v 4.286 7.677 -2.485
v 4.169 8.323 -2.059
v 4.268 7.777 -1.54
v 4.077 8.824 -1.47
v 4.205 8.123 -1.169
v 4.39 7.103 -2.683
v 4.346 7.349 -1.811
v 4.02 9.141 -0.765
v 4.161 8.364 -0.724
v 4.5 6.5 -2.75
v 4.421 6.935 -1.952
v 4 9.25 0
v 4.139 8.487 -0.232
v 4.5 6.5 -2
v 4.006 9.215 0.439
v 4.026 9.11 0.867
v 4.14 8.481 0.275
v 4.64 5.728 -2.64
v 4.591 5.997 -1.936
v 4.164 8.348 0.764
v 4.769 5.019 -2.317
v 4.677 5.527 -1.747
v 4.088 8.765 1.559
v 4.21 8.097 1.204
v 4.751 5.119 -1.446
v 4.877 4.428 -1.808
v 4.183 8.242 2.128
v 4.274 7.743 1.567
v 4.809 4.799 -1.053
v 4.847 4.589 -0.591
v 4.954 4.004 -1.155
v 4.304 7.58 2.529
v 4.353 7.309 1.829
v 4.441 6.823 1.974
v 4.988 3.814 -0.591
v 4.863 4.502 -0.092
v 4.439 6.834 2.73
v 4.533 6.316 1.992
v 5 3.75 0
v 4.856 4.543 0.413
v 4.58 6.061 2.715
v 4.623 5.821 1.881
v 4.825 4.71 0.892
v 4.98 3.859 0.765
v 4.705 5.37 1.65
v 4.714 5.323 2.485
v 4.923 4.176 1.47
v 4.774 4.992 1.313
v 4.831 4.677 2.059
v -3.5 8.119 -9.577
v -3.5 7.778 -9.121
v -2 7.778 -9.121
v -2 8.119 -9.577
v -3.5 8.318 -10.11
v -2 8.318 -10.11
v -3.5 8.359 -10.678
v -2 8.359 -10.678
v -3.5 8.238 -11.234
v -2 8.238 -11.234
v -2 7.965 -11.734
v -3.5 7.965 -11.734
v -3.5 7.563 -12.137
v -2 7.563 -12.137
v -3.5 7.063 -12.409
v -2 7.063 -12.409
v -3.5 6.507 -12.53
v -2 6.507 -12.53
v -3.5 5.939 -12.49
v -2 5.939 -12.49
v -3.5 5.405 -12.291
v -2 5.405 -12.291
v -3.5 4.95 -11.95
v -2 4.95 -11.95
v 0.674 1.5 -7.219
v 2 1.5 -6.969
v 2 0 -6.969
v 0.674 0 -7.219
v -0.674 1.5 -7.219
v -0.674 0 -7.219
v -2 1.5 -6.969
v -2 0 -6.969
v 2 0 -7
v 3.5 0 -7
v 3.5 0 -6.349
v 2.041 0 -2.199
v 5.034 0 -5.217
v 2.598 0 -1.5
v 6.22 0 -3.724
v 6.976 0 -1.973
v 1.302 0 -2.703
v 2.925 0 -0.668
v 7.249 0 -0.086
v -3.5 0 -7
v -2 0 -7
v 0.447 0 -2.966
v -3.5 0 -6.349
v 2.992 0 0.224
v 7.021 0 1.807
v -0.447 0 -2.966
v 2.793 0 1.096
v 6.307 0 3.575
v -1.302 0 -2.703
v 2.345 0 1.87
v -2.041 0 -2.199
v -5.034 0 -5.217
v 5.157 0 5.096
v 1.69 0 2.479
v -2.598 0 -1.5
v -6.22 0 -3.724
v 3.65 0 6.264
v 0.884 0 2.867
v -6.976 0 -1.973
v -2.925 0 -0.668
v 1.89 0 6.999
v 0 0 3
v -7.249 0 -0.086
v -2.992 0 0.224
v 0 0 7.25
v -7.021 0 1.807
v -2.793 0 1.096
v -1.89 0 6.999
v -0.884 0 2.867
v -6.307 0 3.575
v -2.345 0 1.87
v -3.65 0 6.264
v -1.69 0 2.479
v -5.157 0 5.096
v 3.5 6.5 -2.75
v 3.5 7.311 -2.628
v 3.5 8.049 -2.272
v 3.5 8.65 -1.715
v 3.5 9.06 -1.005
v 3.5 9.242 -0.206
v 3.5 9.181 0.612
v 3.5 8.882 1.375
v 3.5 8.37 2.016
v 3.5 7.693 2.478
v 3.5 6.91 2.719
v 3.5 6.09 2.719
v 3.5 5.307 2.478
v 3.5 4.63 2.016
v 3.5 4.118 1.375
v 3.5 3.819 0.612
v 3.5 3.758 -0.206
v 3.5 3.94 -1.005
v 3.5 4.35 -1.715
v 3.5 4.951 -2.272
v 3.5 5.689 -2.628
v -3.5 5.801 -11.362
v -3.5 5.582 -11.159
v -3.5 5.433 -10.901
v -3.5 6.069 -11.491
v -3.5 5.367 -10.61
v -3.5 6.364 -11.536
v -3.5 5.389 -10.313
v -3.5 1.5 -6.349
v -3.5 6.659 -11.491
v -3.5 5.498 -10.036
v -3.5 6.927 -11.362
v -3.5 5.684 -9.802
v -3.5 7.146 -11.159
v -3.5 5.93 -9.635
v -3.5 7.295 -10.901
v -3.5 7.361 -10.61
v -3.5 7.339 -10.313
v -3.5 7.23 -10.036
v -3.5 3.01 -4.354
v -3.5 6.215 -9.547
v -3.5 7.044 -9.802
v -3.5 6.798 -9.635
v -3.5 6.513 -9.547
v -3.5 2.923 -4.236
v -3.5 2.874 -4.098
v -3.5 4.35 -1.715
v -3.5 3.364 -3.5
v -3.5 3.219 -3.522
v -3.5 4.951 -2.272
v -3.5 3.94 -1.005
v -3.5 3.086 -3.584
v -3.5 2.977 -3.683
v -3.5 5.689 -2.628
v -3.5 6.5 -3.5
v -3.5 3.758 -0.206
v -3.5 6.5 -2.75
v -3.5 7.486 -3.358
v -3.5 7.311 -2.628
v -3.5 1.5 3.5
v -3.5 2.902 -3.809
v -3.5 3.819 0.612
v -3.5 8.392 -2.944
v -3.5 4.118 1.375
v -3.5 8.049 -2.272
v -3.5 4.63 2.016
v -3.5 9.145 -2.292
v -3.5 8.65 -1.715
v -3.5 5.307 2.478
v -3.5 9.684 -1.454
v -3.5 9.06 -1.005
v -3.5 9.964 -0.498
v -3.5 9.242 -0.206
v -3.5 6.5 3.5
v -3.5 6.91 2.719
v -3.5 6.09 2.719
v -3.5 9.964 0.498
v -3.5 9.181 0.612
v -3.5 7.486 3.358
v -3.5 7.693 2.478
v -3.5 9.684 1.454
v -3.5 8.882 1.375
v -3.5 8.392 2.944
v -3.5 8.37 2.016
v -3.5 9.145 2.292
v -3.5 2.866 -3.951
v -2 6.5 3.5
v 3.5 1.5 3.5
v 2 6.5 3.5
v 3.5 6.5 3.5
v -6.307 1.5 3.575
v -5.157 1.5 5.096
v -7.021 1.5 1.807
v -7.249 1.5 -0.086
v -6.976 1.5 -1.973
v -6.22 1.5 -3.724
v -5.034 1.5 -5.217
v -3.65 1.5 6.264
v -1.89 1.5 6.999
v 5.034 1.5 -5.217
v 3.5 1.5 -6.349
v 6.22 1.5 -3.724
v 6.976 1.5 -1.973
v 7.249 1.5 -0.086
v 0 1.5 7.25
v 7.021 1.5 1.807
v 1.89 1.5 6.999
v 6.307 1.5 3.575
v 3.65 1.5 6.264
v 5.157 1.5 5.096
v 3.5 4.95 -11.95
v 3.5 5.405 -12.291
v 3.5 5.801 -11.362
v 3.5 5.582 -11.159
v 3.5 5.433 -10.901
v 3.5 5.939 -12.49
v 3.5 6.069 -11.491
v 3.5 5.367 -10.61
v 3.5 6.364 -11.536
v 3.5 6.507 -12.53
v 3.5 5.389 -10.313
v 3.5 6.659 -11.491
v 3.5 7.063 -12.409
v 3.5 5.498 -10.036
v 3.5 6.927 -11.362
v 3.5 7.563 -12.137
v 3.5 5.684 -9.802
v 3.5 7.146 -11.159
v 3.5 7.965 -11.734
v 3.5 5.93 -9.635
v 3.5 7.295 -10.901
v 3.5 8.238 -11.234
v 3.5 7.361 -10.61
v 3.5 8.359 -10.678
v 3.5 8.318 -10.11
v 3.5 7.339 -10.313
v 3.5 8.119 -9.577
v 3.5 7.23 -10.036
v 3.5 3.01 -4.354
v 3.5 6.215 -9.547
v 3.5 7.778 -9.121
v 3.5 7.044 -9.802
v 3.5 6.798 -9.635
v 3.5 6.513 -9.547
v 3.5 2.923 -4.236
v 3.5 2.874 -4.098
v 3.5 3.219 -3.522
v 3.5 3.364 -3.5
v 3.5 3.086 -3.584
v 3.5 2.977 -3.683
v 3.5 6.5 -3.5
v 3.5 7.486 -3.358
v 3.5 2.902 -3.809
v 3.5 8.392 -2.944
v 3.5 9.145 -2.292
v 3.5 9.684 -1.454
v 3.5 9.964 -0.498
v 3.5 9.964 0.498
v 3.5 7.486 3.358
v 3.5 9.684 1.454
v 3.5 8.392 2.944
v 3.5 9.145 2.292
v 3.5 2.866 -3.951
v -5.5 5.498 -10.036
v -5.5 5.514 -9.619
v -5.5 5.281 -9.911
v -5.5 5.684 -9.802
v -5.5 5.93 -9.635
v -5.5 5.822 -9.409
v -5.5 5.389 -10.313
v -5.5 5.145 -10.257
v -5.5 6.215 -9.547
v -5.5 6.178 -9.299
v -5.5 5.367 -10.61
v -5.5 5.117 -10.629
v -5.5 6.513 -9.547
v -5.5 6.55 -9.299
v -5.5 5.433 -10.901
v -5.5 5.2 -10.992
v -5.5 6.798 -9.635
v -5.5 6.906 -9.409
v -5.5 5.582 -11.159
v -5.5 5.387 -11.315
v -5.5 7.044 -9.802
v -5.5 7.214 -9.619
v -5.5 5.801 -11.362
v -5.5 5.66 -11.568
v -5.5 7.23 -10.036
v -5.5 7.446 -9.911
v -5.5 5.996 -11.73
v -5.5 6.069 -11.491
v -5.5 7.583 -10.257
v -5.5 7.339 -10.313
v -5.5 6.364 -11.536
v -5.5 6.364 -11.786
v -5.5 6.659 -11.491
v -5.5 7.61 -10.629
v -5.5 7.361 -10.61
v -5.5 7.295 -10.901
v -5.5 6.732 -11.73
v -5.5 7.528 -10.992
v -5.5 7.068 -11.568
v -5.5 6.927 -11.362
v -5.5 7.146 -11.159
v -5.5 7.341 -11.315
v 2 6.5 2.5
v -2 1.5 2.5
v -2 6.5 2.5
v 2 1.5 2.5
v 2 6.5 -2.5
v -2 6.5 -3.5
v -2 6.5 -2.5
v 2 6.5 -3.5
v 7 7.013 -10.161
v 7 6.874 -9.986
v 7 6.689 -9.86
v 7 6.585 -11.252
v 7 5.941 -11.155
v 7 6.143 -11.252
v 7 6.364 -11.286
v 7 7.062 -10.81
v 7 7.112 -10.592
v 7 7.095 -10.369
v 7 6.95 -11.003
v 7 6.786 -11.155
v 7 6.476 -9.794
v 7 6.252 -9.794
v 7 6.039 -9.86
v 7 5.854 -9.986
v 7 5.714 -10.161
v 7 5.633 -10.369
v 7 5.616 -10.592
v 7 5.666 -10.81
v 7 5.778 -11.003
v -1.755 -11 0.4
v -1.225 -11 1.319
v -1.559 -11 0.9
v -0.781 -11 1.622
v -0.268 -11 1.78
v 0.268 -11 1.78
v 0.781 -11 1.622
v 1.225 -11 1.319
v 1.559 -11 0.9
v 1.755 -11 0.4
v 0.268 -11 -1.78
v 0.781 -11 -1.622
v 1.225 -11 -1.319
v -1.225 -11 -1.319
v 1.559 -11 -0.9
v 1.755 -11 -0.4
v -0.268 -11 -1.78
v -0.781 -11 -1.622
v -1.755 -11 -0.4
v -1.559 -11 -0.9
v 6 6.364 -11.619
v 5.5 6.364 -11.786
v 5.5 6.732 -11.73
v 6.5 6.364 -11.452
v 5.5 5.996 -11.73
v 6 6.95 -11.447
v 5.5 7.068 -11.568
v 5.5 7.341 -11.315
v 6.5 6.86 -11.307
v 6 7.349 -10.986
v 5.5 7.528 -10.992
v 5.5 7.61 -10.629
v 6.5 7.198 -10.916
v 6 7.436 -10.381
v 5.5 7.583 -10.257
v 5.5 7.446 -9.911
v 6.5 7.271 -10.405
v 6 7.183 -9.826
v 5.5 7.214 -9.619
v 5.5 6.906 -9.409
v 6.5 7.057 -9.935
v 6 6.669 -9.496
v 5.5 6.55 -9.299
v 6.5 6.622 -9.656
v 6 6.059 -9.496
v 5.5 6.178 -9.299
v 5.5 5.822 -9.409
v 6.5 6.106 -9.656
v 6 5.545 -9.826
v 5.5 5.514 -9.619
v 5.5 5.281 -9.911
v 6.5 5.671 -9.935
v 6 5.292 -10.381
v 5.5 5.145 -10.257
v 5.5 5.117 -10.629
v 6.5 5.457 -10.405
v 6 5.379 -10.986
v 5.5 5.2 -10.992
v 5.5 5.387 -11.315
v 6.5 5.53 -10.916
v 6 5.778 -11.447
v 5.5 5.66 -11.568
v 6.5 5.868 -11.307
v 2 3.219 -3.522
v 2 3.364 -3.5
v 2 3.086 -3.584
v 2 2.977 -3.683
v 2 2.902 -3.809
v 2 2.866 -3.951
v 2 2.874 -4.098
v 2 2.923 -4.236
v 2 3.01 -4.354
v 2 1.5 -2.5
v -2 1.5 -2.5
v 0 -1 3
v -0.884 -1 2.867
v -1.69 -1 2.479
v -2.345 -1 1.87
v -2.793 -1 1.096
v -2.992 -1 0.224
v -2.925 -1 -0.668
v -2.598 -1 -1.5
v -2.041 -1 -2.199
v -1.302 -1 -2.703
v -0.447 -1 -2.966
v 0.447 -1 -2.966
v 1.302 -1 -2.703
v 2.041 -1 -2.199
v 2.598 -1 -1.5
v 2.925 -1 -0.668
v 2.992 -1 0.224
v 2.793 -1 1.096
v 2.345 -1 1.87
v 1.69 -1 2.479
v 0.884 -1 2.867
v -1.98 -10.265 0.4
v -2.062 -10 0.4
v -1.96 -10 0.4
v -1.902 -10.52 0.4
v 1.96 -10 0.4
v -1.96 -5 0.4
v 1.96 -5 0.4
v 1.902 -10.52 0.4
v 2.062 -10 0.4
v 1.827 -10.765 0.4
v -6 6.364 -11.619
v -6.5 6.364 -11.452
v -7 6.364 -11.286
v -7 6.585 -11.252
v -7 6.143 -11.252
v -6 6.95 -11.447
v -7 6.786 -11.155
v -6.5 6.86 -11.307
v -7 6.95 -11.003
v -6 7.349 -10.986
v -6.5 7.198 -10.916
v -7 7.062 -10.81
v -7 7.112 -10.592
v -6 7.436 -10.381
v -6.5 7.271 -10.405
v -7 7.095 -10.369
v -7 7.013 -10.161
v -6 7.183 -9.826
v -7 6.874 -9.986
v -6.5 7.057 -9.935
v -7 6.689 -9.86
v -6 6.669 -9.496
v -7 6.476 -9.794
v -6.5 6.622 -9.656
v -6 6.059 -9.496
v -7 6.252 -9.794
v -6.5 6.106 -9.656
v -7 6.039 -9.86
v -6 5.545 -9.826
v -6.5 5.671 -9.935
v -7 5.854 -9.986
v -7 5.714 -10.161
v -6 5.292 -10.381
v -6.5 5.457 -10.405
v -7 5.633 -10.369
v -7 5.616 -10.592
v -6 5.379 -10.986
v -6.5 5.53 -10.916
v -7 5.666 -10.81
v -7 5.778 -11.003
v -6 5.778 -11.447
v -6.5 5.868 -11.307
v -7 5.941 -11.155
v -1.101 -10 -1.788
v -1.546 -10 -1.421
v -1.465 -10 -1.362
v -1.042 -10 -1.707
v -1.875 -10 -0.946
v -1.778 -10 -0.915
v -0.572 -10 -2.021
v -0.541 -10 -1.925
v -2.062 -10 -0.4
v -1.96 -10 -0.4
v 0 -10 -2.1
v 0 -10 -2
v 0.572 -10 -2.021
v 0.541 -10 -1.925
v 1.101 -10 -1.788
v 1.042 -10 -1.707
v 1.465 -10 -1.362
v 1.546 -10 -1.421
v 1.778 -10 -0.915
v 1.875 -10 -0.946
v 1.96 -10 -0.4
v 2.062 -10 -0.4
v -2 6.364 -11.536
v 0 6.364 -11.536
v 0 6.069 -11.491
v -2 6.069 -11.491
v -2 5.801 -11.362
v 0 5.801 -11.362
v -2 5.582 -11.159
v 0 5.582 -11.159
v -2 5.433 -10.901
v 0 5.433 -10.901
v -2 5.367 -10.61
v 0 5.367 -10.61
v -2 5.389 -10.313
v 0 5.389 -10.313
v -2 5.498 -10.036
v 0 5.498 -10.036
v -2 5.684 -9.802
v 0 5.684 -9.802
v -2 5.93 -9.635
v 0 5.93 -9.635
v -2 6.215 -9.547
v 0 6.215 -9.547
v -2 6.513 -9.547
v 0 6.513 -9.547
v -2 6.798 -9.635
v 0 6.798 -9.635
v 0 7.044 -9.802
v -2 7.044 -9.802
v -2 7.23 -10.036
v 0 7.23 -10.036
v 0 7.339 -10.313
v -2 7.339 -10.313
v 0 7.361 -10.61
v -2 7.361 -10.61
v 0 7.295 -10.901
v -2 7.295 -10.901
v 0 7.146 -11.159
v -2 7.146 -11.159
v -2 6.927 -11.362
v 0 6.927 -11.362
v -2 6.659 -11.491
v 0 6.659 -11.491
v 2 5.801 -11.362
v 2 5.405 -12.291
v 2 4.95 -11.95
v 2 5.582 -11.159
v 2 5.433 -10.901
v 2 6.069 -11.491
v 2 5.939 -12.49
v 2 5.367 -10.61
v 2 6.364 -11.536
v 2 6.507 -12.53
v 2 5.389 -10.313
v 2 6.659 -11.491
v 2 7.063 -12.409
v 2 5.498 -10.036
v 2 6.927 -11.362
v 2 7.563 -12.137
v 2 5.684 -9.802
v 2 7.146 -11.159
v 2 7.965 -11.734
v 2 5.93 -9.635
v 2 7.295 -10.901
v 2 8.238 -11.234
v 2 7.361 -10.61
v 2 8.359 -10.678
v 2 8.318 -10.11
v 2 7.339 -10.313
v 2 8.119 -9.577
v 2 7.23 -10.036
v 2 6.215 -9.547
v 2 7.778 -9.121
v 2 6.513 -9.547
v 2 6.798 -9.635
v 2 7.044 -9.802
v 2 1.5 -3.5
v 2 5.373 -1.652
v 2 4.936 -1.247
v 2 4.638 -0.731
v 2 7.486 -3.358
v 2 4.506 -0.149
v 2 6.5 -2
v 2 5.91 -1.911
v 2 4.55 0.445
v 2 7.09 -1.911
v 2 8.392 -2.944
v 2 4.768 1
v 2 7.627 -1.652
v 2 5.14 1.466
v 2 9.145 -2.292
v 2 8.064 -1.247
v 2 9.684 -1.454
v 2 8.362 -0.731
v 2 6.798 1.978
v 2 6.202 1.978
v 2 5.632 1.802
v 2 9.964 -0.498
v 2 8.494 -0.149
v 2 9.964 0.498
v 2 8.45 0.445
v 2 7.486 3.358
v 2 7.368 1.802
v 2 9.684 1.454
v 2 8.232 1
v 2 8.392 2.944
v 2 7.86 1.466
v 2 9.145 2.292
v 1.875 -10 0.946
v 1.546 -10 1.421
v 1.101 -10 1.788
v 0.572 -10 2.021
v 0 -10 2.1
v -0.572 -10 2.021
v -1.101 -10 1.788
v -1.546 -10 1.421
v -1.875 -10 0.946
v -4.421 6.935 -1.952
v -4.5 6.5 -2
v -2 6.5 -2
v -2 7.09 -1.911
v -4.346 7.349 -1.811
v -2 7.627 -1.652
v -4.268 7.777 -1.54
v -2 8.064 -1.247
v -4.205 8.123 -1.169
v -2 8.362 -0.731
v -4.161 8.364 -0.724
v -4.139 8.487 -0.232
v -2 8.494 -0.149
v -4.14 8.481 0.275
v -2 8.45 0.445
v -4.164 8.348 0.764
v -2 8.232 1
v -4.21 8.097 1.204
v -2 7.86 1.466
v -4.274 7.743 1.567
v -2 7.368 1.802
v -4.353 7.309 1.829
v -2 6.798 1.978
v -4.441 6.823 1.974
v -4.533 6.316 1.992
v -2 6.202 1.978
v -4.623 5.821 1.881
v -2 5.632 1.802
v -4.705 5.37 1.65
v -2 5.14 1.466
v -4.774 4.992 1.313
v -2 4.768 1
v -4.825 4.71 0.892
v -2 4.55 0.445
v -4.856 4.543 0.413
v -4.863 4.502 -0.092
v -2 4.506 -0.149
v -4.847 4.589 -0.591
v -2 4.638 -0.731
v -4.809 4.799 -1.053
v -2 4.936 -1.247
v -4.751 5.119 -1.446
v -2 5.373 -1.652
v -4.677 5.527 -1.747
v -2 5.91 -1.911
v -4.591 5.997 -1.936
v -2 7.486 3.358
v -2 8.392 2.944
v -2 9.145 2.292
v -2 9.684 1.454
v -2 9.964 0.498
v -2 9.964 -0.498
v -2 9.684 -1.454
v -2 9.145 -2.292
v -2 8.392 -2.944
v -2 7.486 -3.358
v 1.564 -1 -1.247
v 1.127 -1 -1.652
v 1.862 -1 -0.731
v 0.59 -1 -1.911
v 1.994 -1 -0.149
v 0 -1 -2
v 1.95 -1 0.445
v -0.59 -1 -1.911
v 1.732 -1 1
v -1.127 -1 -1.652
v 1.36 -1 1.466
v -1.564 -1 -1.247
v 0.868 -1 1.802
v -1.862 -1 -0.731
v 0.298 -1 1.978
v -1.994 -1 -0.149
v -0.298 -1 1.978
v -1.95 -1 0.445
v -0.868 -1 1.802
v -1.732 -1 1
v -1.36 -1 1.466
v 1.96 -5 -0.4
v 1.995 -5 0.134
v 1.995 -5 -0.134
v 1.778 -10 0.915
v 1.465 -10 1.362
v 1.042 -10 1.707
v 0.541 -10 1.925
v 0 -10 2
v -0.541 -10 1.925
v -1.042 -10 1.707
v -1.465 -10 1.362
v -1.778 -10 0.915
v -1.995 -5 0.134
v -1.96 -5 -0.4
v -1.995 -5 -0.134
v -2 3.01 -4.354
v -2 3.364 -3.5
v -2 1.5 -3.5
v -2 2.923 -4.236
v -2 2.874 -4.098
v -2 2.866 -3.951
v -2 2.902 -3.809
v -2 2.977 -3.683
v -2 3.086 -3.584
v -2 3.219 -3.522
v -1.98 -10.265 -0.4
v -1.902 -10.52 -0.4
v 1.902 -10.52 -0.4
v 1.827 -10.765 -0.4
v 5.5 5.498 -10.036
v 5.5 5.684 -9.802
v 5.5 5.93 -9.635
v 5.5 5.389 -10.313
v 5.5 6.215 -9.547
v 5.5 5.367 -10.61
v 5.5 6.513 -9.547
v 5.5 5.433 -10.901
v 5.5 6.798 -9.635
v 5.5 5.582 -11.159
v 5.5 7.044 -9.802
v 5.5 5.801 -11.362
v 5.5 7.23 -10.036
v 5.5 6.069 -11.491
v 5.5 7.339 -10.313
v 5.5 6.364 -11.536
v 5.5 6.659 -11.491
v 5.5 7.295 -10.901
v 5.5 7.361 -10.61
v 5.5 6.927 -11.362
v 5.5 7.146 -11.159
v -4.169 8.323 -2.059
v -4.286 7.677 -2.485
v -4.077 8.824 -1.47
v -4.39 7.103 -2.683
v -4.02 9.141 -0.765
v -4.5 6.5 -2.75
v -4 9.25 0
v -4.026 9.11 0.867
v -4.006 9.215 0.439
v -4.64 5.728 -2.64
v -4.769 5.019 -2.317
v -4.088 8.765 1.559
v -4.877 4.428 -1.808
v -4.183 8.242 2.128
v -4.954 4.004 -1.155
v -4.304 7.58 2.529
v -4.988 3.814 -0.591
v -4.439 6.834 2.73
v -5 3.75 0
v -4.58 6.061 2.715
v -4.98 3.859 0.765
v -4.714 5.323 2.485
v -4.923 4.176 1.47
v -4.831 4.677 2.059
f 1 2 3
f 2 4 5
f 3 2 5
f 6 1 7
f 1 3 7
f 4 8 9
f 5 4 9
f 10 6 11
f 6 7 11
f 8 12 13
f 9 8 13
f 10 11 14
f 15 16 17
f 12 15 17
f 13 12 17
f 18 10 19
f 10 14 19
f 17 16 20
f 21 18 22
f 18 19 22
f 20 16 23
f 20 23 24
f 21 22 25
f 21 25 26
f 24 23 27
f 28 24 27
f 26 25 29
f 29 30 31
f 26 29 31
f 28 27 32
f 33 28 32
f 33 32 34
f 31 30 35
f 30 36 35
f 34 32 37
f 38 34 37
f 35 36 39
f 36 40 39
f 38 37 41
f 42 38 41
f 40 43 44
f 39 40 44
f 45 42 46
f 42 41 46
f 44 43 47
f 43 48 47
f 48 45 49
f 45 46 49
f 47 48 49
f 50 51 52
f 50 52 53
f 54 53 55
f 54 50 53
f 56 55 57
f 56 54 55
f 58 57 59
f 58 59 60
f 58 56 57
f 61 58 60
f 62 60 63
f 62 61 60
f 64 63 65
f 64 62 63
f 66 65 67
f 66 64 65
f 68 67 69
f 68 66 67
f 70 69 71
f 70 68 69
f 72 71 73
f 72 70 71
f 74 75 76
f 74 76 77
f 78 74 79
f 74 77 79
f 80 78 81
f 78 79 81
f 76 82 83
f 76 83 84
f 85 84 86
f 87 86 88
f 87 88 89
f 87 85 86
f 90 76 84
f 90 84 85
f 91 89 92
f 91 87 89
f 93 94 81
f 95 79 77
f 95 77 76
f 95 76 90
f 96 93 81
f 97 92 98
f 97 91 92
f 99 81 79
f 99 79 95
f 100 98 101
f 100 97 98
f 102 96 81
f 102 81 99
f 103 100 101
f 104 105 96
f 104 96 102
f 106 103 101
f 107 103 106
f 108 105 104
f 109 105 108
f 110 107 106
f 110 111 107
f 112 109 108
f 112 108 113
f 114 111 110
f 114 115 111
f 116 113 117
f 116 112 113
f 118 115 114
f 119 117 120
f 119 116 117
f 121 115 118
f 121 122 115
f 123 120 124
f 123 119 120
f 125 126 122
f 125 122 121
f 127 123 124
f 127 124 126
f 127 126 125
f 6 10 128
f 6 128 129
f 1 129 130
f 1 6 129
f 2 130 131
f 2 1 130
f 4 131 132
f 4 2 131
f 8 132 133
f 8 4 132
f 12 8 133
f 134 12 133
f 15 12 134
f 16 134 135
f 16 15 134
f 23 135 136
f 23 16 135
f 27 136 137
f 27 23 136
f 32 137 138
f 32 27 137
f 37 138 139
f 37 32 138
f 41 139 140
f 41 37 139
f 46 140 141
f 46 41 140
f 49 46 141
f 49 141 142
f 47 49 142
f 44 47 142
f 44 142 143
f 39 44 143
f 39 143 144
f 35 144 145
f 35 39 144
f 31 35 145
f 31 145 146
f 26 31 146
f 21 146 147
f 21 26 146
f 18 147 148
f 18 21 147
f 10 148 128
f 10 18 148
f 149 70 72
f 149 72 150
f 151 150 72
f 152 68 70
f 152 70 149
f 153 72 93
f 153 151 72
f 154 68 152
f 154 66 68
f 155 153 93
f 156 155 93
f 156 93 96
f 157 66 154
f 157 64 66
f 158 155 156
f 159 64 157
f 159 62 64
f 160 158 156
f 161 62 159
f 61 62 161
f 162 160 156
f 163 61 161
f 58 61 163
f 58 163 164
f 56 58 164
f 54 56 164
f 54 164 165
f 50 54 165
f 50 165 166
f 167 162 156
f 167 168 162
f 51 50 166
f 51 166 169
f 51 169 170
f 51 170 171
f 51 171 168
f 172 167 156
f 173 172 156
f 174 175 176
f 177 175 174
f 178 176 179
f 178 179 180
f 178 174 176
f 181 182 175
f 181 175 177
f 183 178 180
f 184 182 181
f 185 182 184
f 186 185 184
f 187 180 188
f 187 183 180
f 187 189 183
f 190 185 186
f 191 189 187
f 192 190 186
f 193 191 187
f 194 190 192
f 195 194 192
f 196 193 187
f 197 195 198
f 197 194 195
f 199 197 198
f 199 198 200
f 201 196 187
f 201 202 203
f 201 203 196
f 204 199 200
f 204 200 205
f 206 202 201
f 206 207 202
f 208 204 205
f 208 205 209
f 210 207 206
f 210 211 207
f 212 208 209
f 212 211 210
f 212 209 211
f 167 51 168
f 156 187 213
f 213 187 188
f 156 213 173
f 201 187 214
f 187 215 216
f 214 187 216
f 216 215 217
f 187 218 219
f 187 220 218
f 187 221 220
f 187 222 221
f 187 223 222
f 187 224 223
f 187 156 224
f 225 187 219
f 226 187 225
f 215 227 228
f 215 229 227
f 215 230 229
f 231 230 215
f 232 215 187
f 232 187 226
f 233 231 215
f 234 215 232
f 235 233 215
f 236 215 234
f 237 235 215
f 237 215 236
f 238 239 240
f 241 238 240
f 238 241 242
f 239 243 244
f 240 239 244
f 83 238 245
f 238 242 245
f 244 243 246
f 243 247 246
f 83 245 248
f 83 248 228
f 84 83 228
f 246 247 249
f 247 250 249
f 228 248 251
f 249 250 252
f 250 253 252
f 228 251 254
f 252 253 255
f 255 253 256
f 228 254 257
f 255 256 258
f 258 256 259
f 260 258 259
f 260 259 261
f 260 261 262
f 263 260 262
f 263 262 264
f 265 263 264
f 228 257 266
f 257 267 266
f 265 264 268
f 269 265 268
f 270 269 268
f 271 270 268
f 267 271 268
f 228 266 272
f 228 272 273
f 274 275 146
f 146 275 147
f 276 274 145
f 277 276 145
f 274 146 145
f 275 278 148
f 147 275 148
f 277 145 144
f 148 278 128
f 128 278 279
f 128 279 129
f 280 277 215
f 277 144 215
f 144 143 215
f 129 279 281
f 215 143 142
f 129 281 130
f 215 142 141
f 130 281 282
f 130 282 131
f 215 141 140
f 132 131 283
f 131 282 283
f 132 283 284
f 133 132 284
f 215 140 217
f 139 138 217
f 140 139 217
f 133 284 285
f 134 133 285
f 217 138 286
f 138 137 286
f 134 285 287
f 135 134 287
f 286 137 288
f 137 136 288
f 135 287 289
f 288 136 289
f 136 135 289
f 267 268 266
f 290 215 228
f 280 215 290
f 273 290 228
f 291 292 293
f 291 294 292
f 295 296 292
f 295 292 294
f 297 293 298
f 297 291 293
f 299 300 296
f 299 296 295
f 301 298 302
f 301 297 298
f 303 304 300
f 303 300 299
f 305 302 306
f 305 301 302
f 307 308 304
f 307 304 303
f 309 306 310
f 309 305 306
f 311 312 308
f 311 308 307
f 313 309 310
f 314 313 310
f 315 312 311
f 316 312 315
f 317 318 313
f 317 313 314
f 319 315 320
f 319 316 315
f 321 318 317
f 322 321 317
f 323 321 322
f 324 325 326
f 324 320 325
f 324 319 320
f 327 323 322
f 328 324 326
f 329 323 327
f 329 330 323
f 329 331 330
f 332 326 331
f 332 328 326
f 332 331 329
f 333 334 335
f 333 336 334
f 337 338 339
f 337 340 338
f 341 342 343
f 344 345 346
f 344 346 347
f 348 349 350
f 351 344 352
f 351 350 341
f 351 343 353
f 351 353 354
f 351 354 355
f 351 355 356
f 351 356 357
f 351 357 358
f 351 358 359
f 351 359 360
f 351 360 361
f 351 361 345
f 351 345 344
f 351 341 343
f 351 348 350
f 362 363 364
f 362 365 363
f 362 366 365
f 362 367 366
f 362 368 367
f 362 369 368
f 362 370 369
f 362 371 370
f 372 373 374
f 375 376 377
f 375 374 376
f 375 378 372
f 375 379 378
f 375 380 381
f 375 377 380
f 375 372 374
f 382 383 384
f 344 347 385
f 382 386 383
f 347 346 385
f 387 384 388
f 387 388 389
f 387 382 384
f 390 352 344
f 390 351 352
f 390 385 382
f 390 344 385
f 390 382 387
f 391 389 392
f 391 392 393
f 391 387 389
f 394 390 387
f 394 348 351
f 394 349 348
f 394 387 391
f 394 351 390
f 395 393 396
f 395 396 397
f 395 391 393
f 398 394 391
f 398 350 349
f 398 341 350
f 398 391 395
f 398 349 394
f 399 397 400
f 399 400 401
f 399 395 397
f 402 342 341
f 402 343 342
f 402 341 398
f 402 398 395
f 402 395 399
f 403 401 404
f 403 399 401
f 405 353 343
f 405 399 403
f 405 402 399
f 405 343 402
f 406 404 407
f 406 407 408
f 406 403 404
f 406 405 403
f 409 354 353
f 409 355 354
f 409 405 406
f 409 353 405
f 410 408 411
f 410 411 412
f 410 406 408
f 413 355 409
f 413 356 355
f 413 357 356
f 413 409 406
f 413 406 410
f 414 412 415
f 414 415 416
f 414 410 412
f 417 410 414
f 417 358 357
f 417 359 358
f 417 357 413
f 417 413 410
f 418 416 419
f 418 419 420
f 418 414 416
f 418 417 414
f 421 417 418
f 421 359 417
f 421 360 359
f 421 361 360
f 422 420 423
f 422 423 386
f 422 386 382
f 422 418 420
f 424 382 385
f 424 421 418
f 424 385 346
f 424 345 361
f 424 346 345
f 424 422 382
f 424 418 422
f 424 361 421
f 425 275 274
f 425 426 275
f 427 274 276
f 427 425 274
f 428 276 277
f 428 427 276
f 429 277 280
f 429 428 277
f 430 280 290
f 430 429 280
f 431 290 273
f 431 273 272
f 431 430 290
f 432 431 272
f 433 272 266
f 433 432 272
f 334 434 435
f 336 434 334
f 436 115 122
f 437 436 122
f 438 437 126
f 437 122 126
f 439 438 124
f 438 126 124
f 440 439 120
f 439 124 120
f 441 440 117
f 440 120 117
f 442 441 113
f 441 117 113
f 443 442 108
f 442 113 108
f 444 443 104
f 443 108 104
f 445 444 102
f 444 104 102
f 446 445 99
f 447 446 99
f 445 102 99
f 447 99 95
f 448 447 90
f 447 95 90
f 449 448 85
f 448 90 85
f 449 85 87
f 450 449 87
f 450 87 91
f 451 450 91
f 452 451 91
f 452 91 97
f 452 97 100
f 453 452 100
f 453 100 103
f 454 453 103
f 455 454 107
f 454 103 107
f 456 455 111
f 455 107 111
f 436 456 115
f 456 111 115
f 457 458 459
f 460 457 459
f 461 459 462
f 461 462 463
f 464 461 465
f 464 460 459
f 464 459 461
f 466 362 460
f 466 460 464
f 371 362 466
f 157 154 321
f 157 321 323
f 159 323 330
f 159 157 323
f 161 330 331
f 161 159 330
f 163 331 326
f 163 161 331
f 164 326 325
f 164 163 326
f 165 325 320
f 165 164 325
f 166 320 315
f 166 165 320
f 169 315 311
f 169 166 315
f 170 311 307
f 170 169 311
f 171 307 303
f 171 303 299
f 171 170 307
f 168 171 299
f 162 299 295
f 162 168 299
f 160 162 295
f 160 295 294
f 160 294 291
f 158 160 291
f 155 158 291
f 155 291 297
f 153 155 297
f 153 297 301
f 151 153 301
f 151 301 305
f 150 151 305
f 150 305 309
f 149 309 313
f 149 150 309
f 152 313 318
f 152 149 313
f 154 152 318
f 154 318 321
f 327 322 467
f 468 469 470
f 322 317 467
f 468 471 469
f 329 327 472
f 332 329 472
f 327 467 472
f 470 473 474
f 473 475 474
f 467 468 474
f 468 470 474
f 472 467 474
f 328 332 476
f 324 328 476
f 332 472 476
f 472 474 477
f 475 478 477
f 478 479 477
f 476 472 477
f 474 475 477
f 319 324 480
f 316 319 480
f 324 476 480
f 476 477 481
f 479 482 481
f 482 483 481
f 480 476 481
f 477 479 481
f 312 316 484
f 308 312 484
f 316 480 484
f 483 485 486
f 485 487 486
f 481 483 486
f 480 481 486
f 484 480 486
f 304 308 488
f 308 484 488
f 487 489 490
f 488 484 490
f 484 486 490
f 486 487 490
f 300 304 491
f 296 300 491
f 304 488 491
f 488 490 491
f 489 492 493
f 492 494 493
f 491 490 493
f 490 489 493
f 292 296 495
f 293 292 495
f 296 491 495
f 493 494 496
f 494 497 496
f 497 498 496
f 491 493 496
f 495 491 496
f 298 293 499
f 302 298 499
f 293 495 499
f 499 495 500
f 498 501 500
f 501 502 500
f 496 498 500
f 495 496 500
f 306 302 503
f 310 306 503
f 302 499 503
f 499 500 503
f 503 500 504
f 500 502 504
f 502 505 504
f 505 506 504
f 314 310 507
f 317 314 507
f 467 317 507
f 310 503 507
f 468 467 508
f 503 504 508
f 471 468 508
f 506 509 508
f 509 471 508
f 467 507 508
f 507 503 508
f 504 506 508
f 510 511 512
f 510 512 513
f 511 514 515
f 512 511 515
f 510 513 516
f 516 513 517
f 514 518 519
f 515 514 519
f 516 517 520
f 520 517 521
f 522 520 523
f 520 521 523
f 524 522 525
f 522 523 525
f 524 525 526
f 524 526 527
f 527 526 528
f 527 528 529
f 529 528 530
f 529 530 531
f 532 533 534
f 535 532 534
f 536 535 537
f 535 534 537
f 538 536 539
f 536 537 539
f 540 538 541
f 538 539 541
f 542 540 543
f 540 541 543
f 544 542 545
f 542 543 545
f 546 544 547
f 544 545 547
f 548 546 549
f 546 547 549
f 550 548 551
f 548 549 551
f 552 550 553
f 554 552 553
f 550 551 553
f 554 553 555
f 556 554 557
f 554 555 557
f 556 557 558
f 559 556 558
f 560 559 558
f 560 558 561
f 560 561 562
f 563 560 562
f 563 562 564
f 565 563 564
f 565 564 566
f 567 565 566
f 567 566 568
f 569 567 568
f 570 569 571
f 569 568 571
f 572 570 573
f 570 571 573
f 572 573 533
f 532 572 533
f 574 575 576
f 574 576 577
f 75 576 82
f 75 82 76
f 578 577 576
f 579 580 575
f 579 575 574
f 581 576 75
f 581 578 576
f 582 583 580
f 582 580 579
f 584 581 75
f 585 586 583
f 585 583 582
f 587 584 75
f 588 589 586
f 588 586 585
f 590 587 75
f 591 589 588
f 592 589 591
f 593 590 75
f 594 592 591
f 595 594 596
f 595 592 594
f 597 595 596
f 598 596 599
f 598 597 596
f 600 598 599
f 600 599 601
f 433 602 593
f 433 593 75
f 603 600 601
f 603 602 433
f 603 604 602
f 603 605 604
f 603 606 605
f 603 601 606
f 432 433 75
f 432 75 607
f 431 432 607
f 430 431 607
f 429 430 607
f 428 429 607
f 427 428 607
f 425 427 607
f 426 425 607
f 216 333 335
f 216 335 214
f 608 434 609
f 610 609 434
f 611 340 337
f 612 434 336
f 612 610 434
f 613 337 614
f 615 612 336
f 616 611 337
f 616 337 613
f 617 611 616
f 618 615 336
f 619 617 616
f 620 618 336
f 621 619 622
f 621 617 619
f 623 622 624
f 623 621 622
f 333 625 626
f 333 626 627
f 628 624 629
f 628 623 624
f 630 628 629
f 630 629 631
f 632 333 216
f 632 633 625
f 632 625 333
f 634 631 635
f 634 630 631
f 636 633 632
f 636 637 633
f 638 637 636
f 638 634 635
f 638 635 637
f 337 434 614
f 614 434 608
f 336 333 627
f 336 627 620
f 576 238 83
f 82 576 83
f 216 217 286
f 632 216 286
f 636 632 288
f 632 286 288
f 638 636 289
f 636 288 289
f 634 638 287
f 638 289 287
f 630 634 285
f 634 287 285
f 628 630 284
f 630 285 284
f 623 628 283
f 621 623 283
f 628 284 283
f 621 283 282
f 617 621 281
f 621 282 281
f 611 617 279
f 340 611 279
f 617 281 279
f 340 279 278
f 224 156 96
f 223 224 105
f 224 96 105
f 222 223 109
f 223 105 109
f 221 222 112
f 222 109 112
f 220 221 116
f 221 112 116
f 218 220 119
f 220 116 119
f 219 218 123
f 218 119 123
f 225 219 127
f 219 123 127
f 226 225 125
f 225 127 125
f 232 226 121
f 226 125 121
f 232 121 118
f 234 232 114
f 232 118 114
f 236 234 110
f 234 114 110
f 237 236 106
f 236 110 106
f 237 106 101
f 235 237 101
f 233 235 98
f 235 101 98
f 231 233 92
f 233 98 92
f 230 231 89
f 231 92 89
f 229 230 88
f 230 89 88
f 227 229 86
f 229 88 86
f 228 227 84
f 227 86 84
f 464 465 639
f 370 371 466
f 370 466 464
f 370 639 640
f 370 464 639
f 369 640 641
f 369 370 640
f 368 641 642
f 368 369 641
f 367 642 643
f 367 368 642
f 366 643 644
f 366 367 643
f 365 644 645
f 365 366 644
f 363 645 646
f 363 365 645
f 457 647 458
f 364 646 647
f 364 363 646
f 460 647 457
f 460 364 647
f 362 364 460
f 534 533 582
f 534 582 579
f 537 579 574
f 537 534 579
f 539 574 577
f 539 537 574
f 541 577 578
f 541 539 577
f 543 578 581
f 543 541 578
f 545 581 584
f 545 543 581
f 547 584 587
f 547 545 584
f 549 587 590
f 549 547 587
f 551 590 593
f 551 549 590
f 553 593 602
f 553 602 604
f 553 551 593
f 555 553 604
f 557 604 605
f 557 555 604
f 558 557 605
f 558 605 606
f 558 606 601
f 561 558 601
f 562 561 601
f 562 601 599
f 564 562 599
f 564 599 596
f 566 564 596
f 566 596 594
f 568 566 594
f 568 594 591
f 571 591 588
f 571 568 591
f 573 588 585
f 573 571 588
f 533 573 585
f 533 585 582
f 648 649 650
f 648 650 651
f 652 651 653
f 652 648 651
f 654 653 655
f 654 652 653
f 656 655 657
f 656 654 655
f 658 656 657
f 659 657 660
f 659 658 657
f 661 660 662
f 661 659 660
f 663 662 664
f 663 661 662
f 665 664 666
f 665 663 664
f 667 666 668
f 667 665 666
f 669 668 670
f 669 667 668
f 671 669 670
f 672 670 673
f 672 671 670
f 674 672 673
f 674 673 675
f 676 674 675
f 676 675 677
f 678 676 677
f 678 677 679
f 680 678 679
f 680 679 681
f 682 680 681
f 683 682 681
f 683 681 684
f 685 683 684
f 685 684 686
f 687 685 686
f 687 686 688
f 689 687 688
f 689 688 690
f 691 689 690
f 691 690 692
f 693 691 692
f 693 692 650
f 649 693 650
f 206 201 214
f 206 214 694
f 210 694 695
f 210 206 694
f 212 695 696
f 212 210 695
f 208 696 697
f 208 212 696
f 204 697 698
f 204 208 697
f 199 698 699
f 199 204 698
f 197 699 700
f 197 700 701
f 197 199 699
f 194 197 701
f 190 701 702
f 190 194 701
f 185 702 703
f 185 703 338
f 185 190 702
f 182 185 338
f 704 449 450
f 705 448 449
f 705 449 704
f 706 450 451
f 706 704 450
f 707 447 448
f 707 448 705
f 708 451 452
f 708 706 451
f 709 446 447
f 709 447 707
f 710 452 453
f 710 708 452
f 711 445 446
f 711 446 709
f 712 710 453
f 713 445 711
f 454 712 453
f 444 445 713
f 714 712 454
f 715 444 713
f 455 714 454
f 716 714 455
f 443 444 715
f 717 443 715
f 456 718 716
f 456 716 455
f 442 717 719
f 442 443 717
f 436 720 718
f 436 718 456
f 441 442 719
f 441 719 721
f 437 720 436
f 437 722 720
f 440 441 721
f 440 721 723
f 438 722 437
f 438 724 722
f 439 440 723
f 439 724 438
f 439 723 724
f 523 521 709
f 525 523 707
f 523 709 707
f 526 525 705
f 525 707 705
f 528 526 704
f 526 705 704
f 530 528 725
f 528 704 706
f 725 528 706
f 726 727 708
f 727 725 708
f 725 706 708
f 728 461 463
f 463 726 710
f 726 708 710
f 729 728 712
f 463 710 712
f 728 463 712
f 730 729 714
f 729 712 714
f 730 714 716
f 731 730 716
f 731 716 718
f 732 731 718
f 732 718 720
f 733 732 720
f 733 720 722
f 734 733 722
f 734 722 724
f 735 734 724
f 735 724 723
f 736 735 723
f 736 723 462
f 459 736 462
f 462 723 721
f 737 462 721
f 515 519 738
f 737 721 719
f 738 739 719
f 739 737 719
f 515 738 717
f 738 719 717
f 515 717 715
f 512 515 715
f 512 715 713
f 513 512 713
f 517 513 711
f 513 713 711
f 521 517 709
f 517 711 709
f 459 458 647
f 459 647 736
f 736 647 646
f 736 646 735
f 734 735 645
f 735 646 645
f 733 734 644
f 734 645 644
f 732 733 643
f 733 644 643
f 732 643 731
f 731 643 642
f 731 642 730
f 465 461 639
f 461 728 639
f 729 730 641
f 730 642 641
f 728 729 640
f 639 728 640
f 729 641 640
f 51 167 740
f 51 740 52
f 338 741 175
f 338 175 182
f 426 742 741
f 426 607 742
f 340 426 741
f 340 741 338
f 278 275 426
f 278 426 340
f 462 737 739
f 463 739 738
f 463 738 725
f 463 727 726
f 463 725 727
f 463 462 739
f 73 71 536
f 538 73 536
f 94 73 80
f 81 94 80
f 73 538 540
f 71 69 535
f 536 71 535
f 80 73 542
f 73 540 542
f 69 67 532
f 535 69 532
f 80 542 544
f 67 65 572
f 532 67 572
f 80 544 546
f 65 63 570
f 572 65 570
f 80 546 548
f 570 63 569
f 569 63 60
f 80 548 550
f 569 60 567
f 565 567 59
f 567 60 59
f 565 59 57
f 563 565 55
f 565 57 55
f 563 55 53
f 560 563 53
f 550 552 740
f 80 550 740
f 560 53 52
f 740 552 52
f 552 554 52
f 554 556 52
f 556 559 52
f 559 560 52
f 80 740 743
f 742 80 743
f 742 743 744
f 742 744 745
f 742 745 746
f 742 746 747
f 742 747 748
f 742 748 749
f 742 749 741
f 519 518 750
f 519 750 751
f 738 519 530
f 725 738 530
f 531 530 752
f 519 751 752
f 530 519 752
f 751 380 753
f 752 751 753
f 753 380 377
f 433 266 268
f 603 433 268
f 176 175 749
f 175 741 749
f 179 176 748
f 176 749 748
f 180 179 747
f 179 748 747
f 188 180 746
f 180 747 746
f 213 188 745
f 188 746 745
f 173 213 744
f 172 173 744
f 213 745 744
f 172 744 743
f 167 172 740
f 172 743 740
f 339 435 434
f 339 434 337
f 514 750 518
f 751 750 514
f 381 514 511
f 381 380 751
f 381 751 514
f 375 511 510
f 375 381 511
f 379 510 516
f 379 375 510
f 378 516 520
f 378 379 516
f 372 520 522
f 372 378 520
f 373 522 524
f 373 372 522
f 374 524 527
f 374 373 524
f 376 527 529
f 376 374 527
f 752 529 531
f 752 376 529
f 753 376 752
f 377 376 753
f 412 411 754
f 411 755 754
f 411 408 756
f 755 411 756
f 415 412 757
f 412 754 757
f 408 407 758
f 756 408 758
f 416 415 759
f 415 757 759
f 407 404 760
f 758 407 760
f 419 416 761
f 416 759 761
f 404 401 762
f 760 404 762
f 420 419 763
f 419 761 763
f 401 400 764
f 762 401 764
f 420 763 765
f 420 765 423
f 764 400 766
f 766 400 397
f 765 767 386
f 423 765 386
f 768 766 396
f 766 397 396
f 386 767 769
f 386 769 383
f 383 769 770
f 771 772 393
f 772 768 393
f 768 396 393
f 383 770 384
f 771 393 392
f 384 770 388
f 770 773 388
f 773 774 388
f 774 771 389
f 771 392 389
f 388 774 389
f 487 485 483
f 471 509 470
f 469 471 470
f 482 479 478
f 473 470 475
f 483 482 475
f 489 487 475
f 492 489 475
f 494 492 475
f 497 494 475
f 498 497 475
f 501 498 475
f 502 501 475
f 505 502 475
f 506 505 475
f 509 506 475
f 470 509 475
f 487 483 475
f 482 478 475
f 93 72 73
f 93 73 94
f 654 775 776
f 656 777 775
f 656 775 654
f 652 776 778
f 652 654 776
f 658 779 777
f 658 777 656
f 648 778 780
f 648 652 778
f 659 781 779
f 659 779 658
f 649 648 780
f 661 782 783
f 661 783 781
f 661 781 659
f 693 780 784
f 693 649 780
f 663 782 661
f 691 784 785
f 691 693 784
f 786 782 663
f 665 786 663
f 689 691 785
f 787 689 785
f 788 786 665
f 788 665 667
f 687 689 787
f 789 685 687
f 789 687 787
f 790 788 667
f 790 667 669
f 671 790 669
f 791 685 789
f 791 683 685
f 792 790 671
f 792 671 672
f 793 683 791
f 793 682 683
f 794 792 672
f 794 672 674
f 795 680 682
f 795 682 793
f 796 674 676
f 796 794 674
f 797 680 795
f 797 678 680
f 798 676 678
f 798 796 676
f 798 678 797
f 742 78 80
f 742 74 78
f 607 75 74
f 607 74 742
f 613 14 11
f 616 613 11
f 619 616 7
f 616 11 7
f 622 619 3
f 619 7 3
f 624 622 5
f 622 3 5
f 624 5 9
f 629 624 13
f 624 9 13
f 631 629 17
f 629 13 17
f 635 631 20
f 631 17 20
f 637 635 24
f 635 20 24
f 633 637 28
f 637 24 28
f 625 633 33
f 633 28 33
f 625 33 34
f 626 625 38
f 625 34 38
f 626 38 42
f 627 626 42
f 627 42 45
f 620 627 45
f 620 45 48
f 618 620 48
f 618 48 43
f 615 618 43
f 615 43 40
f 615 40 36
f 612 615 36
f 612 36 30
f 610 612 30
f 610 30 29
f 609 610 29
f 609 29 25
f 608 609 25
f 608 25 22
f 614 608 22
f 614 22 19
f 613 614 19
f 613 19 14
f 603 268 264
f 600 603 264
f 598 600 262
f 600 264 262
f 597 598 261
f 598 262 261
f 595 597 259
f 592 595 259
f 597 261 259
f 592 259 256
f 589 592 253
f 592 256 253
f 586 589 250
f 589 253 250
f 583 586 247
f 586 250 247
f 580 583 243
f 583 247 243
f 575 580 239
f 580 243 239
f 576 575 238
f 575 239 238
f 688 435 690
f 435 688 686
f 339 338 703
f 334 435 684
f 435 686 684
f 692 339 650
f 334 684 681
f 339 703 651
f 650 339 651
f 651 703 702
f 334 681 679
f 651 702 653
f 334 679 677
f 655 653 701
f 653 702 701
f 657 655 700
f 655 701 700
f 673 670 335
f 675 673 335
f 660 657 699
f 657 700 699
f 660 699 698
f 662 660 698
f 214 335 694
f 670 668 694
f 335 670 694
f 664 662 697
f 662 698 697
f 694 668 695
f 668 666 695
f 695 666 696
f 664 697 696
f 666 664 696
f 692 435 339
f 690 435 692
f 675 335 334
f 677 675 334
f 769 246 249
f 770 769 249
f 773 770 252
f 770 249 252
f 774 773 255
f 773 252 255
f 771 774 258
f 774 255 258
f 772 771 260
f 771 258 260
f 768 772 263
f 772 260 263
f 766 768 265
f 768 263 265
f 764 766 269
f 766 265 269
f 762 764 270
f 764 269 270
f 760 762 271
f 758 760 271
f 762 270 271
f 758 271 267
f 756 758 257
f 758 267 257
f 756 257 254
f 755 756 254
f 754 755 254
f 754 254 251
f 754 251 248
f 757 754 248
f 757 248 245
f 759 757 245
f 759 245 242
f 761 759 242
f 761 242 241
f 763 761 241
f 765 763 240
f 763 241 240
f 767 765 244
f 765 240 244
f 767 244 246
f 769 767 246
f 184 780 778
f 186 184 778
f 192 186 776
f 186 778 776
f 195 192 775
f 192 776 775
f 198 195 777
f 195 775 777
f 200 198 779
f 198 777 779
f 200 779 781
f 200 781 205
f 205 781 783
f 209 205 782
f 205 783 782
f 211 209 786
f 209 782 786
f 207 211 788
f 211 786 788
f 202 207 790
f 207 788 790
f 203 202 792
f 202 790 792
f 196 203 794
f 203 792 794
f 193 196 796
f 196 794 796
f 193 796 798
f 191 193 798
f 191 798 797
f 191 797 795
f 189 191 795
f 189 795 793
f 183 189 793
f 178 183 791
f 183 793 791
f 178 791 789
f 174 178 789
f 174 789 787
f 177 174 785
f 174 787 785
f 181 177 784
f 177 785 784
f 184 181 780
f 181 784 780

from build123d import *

# Parameters (mm, degrees)
SKETCH_1_R          = 7.25
EXTRUDE_1_DEPTH     = 1.5
EXTRUDE_2_DEPTH     = 1.5
FILLET_1_R          = 0.5
CUT_EXTRUDE_1_REACH = 21.305
SKETCH_3_R          = 2
EXTRUDE_START       = 1.5
SKETCH_4_R          = 2.75
SKETCH_4_R_2        = 2
EXTRUDE_3_DEPTH     = 1.5
CUT_EXTRUDE_2_REACH = 22.241
SKETCH_6_R          = 1
EXTRUDE_4_DEPTH     = 2
SKETCH_7_R          = 1.25
SKETCH_8_R          = 0.75
EXTRUDE_START_2     = 2
SKETCH_9_R          = 1
SKETCH_9_W          = 1
SKETCH_9_H          = 5
EXTRUDE_5_DEPTH     = 2
SKETCH_10_R         = 3
EXTRUDE_6_DEPTH     = 1
SKETCH_11_R         = 2
EXTRUDE_7_DEPTH     = 9
SKETCH_12_R         = 2.1
SKETCH_13_R         = 1.8
SKETCH_14_W         = 8
SKETCH_14_H         = 0.8
CUT_EXTRUDE_3_DEPTH = 6


# Read off the part's stored shape, not the designer's step: 镜向1
with BuildPart() as part:
    # 草图1 → 凸台-拉伸1 (new body)
    with BuildSketch(Plane(origin=(0, 0, 0), x_dir=(1, 0, 0), z_dir=(0, 1, 0))):
        with Locations(Location((0, 0, 0), (0, 0, 270))):
            Circle(SKETCH_1_R)
    extrude(amount=EXTRUDE_1_DEPTH)

    # 草图2 → 凸台-拉伸2 (add)
    with BuildSketch(Plane(origin=(3.5, 0, 0), x_dir=(0, 0, -1), z_dir=(1, 0, 0))):
        with BuildLine():
            Line((0, 0), (-3.5, 0))
            Line((-3.5, 0), (-3.5, 6.5))
            ThreePointArc((-3.5, 6.5), (0, 10), (3.5, 6.5))
            Line((3.5, 6.5), (3.5, 2.156854249))
            Line((3.5, 2.156854249), (9.121320344, 7.778174593))
            ThreePointArc((9.121320344, 7.778174593), (11.949747468, 7.778174593), (11.949747468, 4.949747468))
            Line((11.949747468, 4.949747468), (7, 0))
            Line((7, 0), (0, 0))
        make_face()
    extrude(amount=-EXTRUDE_2_DEPTH)

    # 圆角1
    fillet_1_edges = [part.edges().sort_by_distance(p)[0] for p in [
        (2.75, 2.156854249, -3.5),
    ]]
    fillet(fillet_1_edges, radius=FILLET_1_R)

    # 草图3 → 切除-拉伸1 (cut, up to next)
    with BuildSketch(Plane(origin=(3.5, 0, 0), x_dir=(0, 0, -1), z_dir=(1, 0, 0)), mode=Mode.PRIVATE) as cut_extrude_1_sk1:
        with Locations((0, 6.5)):
            Circle(SKETCH_3_R)
    cut_extrude_1_tool1 = extrude(cut_extrude_1_sk1.sketch, amount=-CUT_EXTRUDE_1_REACH, mode=Mode.PRIVATE) & part.part
    add(cut_extrude_1_tool1.solids().sort_by_distance((3.5, 6.5, 0))[0], mode=Mode.SUBTRACT)

    # 草图4 → 凸台-拉伸3 (add)
    with BuildSketch(Plane(origin=(3.5, 0, 0), x_dir=(0, 0, -1), z_dir=(1, 0, 0)).offset(EXTRUDE_START)):
        with Locations((0, 6.5)):
            Circle(SKETCH_4_R)
        with Locations((0, 6.5)):
            Circle(SKETCH_4_R_2, mode=Mode.SUBTRACT)
    extrude(amount=-EXTRUDE_3_DEPTH)

    # 草图5 → 切除-拉伸2 (cut, up to next)
    with BuildSketch(Plane.XY.offset(3.5), mode=Mode.PRIVATE) as cut_extrude_2_sk1:
        Polygon((5, 9.25), (4, 9.25), (5, 3.75), align=None)
    cut_extrude_2_tool1 = extrude(cut_extrude_2_sk1.sketch, amount=-CUT_EXTRUDE_2_REACH, mode=Mode.PRIVATE) & part.part
    add(cut_extrude_2_tool1.solids().sort_by_distance((4.666667, 7.416667, 3.5))[0], mode=Mode.SUBTRACT)

    # 草图6 → 凸台-拉伸4 (add)
    with BuildSketch(Plane(origin=(3.5, 0, 0), x_dir=(0, 0, -1), z_dir=(1, 0, 0))):
        with Locations((10.535533906, 6.363961031)):
            Circle(SKETCH_6_R)
    extrude(amount=EXTRUDE_4_DEPTH)

    # 草图7 → 放样1 section 0
    with BuildSketch(Plane(origin=(5.5, 0, 0), x_dir=(0, 0, -1), z_dir=(1, 0, 0))):
        with Locations((10.535533906, 6.363961031)):
            Circle(SKETCH_7_R)
    # 草图8 → 放样1 section 1
    with BuildSketch(Plane(origin=(7, 0, 0), x_dir=(0, 0, -1), z_dir=(1, 0, 0))):
        with Locations((10.535533906, 6.363961031)):
            Circle(SKETCH_8_R)
    loft()

    # 草图9 → 凸台-拉伸5 (add)
    with BuildSketch(Plane.ZY.offset(-2).offset(EXTRUDE_START_2)):
        with Locations(Location((-10.535533906, 6.363961031, 0), (0, 0, 180))):
            Circle(SKETCH_9_R)
        with Locations((3, 4)):
            Rectangle(SKETCH_9_W, SKETCH_9_H)
        with Locations((-3, 4)):
            Rectangle(SKETCH_9_W, SKETCH_9_H)
    extrude(amount=-EXTRUDE_5_DEPTH)

    # 镜向1: part across plane


with BuildPart() as part_1:
    add(part.part)
    add(part.part.mirror(Plane(origin=(0, 0, 0), x_dir=(0, 0, 1), z_dir=(1, 0, 0))))

    # 草图10 → 凸台-拉伸6 (add)
    with BuildSketch(Plane.XZ):
        with Locations(Location((0, 0, 0), (0, 0, 90))):
            Circle(SKETCH_10_R)
    extrude(amount=EXTRUDE_6_DEPTH)

    # 草图11 → 凸台-拉伸7 (add)
    with BuildSketch(Plane.XZ.offset(1)):
        with Locations(Location((0, 0, 0), (0, 0, 270))):
            Circle(SKETCH_11_R)
    extrude(amount=EXTRUDE_7_DEPTH)

    # 草图12 → 放样2 section 0
    with BuildSketch(Plane.XZ.offset(10)):
        Circle(SKETCH_12_R)
    # 草图13 → 放样2 section 1
    with BuildSketch(Plane(origin=(0, -11, 0), x_dir=(-1, 0, 0), z_dir=(0, -1, 0))):
        Circle(SKETCH_13_R)
    loft()

    # 草图14 → 切除-拉伸3 (cut)
    with BuildSketch(Plane.XZ.offset(11)):
        Rectangle(SKETCH_14_W, SKETCH_14_H)
    extrude(amount=-CUT_EXTRUDE_3_DEPTH, mode=Mode.SUBTRACT)


solid = part_1.part
